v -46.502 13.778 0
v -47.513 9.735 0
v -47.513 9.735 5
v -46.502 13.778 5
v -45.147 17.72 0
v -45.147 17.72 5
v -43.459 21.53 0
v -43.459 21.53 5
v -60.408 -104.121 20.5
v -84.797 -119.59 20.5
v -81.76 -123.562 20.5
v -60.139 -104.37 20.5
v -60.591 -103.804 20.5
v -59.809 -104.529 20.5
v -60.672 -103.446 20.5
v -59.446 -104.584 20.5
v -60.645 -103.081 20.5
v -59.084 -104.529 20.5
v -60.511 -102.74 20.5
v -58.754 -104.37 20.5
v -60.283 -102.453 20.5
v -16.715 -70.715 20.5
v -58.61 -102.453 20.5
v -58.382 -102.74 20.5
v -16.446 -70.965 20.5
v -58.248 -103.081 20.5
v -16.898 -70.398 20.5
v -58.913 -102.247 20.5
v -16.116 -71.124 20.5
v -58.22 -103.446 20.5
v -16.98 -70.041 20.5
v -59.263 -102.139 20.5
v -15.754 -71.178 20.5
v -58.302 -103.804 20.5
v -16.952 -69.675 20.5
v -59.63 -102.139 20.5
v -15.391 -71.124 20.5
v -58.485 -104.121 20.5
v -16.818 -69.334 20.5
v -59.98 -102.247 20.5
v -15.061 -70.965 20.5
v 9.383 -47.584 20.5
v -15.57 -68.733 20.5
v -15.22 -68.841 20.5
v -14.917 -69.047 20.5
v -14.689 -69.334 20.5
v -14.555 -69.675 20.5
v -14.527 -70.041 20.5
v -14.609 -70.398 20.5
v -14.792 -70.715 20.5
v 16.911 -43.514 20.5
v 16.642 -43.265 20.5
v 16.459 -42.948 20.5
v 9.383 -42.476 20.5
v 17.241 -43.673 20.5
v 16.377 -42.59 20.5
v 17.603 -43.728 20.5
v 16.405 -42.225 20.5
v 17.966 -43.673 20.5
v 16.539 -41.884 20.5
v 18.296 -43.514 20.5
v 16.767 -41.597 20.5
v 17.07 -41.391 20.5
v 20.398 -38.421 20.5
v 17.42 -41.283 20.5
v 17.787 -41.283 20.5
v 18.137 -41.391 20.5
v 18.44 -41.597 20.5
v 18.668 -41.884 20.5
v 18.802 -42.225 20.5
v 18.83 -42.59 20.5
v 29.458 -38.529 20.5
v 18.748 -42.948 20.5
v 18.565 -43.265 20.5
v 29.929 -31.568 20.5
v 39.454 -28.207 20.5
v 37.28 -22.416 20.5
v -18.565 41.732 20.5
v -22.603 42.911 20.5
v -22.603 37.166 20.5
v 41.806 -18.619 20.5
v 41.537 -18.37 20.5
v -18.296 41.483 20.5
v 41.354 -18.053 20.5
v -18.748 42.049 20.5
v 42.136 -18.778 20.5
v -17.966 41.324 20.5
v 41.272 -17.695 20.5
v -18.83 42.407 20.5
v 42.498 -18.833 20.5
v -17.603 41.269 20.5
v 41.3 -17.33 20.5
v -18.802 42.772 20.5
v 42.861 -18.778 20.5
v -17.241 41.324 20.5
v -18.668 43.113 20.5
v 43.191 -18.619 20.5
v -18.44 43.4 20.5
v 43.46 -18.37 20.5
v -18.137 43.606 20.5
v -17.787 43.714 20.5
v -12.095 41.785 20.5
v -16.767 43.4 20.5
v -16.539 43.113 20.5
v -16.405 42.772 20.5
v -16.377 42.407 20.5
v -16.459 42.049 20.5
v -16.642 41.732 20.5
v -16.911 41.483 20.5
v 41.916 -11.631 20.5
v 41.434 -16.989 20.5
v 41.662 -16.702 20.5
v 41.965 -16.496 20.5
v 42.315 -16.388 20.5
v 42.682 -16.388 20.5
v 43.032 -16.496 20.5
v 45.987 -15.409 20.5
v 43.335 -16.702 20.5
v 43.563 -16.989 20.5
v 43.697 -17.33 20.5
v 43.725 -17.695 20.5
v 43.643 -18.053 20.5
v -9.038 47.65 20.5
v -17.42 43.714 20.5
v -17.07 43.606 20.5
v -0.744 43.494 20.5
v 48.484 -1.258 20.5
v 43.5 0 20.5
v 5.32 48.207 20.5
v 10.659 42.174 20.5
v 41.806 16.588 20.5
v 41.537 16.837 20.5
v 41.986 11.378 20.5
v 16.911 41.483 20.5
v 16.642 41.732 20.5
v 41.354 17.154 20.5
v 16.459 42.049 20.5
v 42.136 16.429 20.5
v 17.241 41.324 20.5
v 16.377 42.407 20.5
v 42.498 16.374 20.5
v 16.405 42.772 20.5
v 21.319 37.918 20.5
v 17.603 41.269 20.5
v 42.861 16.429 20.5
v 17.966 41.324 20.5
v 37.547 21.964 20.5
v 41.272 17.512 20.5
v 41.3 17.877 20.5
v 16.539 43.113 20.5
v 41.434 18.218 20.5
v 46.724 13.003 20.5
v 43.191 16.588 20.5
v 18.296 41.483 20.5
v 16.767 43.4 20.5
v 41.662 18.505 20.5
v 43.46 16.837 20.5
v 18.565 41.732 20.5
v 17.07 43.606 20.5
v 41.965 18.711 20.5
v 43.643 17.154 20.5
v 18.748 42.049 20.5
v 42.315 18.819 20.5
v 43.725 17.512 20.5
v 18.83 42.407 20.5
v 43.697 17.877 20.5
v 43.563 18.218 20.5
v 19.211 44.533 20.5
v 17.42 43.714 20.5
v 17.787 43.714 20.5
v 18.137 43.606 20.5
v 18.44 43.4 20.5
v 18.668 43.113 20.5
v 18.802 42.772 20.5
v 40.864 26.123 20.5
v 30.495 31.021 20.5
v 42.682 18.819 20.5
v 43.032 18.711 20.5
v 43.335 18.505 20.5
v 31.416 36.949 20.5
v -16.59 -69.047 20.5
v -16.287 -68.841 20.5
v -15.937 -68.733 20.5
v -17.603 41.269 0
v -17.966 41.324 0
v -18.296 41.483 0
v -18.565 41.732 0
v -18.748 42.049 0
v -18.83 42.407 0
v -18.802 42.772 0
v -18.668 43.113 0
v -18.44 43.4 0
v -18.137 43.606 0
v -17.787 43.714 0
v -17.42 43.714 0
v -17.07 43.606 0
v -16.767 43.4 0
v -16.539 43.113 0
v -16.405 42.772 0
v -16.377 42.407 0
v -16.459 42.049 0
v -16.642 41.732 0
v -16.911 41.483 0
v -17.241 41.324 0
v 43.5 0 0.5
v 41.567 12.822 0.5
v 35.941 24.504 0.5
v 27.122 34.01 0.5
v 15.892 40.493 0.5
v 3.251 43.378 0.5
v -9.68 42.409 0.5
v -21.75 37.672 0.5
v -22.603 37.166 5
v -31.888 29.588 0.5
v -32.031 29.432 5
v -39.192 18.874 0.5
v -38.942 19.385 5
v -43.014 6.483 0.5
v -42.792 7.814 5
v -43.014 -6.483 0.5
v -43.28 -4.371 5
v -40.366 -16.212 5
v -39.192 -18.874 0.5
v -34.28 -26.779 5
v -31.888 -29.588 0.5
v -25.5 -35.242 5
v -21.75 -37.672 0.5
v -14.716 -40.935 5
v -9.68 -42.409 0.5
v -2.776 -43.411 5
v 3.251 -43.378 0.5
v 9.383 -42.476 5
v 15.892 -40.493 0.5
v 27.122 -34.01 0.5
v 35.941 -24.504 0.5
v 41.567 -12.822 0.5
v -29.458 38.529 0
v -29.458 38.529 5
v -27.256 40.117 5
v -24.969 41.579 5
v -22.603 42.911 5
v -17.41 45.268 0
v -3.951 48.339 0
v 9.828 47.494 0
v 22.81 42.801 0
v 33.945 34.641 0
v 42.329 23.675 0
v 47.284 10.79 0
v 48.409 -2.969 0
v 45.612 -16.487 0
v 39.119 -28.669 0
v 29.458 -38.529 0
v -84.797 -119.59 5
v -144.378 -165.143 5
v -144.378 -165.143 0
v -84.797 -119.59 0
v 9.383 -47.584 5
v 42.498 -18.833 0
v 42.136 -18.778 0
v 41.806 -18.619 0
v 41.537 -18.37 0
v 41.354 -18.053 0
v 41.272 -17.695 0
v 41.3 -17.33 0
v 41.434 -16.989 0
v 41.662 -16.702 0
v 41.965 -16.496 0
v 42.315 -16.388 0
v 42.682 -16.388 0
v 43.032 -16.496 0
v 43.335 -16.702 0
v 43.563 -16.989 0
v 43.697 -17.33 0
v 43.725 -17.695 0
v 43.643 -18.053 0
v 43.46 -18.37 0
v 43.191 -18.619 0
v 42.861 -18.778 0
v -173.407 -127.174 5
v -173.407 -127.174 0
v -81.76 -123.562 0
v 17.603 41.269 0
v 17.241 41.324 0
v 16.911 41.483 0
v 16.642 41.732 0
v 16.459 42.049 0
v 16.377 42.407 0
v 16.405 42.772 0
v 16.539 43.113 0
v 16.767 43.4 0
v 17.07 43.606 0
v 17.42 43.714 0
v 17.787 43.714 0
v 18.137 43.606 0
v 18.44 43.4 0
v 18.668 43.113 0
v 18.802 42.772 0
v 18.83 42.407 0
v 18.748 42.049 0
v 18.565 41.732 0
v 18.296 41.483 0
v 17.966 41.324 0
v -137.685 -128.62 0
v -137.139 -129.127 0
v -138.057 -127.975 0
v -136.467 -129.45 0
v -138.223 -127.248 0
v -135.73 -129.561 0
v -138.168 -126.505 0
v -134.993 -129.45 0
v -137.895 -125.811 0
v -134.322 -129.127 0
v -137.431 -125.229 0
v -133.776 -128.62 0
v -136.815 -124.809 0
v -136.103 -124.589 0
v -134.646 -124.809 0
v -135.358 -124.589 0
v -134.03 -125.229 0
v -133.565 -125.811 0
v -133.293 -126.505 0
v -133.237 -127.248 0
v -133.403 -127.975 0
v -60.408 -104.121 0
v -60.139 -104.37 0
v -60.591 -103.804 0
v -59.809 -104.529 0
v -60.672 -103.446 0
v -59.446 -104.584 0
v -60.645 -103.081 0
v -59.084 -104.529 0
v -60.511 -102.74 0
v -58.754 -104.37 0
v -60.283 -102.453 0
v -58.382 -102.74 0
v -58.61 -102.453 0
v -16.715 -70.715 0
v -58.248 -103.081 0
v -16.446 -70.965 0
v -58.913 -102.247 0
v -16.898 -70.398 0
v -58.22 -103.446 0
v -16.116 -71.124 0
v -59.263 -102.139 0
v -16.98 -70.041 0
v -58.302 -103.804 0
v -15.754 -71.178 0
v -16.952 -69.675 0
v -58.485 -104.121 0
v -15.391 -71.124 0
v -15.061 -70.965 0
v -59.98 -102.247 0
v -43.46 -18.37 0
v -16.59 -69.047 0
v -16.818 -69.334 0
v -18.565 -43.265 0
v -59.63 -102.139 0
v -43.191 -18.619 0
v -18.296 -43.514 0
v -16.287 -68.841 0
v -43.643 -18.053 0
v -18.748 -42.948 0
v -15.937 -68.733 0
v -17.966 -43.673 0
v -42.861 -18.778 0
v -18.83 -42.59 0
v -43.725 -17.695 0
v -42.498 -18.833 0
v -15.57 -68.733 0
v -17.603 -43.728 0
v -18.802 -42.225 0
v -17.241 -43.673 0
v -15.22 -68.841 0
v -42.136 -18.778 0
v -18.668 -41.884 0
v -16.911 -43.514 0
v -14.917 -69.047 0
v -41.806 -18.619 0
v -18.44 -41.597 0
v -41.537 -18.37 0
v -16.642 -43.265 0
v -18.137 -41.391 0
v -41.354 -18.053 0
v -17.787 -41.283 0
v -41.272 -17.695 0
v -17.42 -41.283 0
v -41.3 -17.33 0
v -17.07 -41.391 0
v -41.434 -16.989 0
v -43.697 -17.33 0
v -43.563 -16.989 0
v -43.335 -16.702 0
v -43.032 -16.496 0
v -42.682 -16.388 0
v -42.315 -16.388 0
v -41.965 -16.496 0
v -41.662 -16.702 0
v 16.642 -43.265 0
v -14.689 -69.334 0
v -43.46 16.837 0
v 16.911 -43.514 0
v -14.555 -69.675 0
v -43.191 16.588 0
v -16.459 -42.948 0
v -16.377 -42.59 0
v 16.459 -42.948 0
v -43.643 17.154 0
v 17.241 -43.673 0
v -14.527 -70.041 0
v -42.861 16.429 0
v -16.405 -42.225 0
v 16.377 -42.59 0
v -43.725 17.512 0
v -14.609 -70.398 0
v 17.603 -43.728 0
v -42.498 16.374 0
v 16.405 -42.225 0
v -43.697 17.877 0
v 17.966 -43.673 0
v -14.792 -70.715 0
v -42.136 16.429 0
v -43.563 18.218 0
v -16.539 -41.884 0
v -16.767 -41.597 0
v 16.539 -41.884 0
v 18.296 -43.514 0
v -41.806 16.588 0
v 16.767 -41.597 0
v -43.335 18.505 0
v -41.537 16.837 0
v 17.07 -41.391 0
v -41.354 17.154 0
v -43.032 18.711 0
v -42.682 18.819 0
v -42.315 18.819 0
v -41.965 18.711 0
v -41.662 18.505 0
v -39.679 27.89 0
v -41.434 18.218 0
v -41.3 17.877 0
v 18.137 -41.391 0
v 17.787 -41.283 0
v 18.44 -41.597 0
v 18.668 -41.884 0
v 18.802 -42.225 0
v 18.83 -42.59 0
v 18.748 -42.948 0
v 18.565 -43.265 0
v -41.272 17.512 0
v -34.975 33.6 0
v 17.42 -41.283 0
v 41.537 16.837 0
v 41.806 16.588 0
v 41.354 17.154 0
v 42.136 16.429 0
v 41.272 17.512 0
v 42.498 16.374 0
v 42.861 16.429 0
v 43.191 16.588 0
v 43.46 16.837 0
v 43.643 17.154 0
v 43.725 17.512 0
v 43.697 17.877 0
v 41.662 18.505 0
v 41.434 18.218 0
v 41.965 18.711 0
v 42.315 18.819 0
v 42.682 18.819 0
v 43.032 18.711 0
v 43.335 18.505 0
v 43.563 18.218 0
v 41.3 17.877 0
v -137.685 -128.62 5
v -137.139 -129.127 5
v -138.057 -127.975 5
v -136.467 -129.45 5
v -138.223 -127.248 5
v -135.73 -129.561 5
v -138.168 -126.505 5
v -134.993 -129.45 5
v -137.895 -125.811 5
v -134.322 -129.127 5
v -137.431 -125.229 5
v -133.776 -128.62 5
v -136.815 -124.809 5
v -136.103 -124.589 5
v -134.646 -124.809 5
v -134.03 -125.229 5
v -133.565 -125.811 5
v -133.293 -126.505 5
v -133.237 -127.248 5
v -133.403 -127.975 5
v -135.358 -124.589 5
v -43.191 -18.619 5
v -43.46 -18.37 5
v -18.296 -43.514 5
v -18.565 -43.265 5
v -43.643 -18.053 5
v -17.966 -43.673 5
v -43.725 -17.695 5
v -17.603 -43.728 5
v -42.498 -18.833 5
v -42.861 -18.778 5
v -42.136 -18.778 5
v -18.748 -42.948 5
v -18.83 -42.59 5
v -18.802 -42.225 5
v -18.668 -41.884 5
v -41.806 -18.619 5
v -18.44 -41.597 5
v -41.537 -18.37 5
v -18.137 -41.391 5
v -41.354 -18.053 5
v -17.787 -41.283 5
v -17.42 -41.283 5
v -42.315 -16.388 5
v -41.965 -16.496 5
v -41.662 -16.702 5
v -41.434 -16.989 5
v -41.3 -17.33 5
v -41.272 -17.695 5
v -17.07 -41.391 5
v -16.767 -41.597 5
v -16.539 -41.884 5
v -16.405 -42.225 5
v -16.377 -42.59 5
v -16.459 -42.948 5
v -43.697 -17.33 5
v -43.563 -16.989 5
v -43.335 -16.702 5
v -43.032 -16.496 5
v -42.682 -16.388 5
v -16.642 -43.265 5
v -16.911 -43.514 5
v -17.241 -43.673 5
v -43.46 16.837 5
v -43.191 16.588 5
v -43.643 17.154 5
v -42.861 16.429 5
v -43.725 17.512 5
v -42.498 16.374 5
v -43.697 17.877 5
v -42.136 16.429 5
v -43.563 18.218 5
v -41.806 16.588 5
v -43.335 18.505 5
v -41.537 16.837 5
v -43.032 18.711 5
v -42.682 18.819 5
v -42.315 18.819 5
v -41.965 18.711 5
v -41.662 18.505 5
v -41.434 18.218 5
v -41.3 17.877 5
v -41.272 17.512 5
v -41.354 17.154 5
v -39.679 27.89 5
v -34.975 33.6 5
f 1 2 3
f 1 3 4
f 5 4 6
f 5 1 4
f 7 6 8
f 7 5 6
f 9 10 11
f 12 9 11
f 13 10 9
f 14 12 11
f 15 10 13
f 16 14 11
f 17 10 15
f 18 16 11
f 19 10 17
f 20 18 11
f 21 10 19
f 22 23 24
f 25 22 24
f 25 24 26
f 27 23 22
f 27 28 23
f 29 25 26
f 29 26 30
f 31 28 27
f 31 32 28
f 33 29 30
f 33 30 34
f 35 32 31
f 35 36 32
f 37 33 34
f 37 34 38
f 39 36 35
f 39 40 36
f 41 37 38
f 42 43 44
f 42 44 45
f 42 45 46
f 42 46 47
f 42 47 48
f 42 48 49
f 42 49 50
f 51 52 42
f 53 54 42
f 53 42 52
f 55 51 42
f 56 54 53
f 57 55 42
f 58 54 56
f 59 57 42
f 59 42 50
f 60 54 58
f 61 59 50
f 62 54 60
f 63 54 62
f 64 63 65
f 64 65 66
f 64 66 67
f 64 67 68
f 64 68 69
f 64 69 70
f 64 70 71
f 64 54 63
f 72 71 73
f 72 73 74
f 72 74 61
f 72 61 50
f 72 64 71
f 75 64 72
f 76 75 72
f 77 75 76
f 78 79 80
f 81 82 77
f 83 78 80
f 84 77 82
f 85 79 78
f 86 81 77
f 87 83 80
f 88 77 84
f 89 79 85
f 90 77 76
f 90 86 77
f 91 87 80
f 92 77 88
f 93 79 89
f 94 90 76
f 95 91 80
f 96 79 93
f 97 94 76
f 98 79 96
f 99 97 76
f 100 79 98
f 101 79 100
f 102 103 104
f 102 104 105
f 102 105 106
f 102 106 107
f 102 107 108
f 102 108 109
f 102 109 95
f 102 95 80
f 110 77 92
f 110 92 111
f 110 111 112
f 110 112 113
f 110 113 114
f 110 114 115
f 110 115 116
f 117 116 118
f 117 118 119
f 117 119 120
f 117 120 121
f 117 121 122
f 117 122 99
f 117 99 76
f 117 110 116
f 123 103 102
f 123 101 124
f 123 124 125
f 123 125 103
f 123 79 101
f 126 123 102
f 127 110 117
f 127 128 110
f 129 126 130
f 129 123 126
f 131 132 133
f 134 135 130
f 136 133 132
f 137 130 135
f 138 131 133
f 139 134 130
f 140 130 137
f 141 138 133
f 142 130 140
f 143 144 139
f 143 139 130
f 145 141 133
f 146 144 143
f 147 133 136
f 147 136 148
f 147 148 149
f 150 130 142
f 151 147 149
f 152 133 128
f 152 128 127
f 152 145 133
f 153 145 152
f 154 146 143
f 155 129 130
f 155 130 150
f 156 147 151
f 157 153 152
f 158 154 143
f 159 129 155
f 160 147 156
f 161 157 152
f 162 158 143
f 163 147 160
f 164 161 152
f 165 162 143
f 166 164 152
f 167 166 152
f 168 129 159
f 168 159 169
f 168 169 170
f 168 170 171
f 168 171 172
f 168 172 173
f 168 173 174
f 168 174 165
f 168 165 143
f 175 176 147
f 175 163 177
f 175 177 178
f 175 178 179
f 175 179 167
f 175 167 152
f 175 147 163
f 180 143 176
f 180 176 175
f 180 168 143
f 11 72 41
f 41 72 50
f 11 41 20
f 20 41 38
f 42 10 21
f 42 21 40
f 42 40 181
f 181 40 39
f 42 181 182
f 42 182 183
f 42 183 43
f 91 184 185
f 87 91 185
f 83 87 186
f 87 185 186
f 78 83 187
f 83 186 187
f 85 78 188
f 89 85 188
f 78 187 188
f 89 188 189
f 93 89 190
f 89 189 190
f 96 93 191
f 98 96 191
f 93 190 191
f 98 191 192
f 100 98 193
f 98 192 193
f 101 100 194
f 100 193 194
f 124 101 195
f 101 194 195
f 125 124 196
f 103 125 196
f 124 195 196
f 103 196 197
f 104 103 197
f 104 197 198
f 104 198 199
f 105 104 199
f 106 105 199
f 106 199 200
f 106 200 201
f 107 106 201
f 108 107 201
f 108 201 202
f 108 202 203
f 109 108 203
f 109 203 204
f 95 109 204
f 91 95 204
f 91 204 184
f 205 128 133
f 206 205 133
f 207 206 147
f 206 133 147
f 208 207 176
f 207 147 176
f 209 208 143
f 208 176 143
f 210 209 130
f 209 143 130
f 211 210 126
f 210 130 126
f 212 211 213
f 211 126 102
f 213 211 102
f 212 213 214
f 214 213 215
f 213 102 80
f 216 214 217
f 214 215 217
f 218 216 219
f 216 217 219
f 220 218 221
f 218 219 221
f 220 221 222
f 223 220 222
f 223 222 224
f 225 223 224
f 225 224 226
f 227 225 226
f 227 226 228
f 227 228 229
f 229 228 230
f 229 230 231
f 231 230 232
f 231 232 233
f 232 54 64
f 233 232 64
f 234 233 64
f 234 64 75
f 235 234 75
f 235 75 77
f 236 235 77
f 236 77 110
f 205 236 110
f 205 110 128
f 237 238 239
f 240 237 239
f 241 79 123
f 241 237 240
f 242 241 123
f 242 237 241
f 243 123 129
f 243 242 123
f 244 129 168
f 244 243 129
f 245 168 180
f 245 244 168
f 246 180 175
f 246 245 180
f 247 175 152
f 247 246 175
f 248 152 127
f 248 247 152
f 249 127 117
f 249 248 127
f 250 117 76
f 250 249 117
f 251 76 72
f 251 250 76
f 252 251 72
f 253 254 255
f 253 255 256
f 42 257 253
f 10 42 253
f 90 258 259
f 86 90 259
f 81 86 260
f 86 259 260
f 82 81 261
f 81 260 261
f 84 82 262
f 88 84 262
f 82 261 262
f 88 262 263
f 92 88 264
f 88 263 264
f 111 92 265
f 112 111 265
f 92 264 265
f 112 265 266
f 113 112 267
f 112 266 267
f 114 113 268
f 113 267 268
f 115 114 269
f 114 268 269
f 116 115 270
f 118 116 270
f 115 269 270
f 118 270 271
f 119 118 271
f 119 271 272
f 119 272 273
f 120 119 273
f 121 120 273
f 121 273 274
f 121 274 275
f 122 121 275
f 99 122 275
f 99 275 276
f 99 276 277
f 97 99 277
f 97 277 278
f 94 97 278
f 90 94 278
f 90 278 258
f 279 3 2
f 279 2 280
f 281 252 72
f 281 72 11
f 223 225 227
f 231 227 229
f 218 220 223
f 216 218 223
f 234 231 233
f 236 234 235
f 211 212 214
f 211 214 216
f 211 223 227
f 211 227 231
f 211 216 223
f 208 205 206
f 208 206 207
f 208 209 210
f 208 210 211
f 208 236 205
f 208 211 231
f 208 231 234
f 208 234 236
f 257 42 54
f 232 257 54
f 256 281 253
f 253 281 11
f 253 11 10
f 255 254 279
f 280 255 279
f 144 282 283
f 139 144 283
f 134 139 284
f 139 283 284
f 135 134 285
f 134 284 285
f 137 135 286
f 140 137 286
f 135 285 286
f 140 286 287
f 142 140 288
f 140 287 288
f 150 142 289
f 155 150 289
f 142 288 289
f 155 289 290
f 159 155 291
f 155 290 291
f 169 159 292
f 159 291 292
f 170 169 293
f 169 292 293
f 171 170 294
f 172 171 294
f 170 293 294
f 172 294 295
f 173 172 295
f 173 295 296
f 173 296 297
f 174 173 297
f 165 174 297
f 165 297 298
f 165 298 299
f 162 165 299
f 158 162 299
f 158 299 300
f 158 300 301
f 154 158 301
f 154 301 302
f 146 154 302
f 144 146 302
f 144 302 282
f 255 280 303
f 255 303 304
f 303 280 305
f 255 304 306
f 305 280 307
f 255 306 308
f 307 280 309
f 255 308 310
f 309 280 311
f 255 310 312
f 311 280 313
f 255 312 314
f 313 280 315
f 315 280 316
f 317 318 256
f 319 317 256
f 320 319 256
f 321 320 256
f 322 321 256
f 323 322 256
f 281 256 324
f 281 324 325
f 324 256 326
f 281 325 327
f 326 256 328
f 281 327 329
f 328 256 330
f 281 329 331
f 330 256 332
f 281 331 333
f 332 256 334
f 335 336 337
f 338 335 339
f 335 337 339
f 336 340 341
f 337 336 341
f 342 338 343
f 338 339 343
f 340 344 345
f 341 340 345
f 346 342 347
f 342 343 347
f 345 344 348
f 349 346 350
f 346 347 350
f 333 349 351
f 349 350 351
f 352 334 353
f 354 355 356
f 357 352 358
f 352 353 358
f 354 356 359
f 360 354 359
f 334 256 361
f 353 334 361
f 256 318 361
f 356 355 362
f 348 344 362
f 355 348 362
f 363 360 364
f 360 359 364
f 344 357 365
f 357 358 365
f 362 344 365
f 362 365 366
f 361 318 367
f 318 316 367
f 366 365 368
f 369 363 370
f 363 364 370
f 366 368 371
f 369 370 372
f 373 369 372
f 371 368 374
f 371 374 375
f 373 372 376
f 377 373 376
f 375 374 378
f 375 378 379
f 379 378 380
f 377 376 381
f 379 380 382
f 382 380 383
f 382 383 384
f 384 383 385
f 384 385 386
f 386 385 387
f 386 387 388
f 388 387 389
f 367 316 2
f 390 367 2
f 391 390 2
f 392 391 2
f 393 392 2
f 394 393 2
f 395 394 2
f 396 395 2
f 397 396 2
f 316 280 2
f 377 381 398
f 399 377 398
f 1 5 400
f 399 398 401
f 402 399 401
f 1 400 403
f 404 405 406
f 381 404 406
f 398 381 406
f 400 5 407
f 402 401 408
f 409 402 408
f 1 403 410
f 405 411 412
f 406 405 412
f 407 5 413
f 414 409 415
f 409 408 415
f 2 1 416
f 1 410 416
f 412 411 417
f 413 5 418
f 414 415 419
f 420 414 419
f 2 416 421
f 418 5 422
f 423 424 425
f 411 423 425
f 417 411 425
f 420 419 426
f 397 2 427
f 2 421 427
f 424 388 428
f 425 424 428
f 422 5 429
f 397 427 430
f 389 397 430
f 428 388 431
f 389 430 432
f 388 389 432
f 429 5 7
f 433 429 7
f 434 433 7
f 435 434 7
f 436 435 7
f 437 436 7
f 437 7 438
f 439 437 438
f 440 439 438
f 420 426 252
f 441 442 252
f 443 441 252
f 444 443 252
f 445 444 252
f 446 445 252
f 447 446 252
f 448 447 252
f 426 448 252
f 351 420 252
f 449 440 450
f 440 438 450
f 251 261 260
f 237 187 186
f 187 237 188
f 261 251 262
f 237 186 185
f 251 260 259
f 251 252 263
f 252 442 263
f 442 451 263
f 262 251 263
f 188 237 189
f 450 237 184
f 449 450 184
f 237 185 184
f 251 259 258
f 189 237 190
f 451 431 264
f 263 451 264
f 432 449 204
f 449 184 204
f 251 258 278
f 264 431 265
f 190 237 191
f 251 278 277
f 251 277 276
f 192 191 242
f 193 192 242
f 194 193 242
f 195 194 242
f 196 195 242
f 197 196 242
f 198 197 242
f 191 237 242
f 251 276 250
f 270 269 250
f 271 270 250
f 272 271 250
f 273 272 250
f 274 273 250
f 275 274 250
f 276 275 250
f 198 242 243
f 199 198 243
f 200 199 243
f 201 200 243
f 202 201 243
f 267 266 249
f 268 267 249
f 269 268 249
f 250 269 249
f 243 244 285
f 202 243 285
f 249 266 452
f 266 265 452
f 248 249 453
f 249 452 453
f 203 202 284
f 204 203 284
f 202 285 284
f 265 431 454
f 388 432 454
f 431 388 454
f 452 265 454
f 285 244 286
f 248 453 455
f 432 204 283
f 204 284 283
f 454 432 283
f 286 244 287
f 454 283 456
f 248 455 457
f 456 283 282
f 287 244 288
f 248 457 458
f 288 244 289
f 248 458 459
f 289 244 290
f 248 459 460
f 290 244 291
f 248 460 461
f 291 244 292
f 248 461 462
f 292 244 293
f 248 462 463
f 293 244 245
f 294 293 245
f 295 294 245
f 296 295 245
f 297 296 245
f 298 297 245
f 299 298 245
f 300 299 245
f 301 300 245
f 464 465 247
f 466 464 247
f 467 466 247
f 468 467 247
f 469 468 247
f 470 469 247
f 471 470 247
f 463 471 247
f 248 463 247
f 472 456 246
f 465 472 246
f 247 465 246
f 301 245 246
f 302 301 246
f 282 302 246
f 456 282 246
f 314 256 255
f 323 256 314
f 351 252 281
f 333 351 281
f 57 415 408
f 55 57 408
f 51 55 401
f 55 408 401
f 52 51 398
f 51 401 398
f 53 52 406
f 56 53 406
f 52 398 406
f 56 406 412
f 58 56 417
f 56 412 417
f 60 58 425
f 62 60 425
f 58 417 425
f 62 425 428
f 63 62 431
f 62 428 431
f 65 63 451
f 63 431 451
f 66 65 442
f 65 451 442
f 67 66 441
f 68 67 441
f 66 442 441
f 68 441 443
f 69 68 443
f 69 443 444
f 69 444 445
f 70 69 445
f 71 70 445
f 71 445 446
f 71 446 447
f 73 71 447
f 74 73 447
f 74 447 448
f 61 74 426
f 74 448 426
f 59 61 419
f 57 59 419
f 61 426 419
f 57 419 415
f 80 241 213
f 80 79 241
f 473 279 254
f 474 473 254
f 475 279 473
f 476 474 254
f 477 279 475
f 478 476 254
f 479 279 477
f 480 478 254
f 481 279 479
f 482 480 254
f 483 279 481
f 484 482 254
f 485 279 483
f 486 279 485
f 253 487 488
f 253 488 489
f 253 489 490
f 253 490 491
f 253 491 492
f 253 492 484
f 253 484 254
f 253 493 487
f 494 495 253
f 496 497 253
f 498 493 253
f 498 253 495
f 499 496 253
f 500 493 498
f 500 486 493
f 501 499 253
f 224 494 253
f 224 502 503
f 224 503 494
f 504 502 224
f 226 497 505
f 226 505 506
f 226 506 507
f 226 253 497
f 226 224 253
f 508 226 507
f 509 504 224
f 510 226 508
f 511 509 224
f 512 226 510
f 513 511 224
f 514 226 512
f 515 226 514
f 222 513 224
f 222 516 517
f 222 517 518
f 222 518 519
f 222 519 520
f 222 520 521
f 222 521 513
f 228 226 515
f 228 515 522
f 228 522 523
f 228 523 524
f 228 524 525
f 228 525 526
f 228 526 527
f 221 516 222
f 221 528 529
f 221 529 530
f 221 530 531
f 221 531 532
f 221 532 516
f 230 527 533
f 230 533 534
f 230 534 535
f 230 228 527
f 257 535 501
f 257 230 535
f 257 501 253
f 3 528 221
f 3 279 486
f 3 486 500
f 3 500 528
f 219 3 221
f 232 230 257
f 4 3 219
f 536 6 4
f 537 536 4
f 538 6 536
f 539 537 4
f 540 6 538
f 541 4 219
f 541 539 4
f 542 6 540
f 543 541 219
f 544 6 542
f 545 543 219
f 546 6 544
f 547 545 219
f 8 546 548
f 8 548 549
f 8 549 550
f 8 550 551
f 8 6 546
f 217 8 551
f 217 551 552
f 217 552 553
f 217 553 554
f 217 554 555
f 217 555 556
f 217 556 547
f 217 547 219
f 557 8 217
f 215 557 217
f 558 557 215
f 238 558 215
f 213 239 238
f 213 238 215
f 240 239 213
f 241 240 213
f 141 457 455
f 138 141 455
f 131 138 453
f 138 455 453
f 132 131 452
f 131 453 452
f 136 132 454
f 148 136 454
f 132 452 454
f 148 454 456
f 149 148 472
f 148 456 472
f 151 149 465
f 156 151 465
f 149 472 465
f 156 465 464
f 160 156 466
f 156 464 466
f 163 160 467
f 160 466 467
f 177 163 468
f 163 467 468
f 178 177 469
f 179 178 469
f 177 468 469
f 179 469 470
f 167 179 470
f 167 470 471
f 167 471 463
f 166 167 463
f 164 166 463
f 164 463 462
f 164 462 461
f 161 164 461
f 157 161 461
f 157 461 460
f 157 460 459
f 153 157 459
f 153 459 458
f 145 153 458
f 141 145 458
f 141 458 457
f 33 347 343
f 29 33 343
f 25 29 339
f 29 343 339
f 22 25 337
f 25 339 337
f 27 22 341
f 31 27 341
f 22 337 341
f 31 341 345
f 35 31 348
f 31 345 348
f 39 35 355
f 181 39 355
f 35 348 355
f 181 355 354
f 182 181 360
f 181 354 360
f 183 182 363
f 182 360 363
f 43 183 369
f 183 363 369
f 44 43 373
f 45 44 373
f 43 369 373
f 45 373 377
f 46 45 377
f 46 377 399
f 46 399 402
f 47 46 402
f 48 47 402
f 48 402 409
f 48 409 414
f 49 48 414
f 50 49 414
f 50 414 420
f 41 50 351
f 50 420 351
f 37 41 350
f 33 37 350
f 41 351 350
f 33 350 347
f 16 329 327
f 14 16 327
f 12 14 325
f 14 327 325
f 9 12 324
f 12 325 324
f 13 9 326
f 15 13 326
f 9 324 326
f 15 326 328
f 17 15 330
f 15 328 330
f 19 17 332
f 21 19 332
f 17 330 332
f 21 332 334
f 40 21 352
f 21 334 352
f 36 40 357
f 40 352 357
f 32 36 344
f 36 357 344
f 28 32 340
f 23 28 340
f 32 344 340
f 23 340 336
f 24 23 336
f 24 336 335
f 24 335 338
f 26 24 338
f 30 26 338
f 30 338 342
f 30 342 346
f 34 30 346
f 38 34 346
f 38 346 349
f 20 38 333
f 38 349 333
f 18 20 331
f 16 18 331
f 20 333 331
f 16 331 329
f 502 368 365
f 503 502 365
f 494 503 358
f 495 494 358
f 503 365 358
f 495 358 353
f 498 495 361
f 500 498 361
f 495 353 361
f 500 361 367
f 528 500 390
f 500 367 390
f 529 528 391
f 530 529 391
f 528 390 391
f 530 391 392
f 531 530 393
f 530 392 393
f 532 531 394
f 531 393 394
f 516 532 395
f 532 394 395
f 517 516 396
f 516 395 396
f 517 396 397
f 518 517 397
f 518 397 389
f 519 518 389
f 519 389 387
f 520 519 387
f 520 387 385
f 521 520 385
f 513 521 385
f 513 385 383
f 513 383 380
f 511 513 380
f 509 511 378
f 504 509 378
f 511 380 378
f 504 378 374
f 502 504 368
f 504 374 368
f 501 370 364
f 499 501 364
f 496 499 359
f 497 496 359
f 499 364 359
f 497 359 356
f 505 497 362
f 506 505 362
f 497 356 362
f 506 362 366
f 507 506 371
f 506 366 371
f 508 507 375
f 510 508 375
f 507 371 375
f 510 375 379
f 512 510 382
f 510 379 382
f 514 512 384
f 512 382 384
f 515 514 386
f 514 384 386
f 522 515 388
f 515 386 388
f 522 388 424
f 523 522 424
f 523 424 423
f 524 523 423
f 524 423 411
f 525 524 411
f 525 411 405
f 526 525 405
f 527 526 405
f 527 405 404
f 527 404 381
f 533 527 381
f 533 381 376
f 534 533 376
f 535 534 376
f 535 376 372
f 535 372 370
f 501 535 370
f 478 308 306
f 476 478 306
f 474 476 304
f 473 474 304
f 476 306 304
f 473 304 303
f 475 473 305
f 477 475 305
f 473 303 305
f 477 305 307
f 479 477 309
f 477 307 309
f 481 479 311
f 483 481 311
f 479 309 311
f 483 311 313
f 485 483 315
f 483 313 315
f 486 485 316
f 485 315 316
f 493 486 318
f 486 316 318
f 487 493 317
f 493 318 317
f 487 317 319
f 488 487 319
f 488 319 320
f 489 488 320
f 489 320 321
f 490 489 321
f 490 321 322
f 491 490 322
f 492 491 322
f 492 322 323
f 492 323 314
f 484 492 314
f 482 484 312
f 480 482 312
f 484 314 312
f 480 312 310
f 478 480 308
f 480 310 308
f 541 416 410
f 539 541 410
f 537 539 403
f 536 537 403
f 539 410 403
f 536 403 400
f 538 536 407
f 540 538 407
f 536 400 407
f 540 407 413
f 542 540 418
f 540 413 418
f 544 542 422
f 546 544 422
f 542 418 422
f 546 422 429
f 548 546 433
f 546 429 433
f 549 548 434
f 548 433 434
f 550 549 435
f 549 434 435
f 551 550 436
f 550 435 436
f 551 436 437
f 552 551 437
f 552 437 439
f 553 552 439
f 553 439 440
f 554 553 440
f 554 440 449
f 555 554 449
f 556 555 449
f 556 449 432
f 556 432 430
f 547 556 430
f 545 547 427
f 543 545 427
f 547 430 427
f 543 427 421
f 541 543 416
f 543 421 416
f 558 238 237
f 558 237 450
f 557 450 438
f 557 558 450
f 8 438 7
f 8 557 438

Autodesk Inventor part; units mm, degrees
ref_plane "YZ Plane" through (0, 0, 0) normal (1, 0, 0) x (0, 1, 0)
ref_plane "XZ Plane" through (0, 0, 0) normal (0, 1, 0) x (-1, 0, 0)
ref_plane "XY Plane" through (0, 0, 0) normal (0, 0, 1) x (1, 0, 0)
sketch "スケッチ1" plane through (0, 0, 0) normal (0, 0, 1) x (1, 0, 0)
  circle A0 centre (0, 0) radius 48.5
  circle A1 centre (0, 0) radius 46
  dimension "d0" = 97
  dimension "d1" = 92
extrude "押し出し1" add sketch "スケッチ1" along normal blind 20.5 contours A0 | A1
sketch "スケッチ2" plane through (0, 0, 20.5) normal (0, 0, 1) x (1, 0, 0)
  circle A0 centre (0, 0) radius 46
  line L0 (0, 0) -> (0, 59.211017)
  line L1 (0, 0) -> (-21.860946, 52.776992)
  line L2 (0, 0) -> (27.822621, 47.858094)
  point P0 (-17.603438, 42.498458)
  point P1 (-42.498458, 17.603438)
  point P2 (-42.498458, -17.603438)
  point P3 (-17.603438, -42.498458)
  point P4 (17.603438, -42.498458)
  point P5 (42.498458, -17.603438)
  point P6 (42.498458, 17.603438)
  point P7 (17.603438, 42.498458)
  dimension "d4" = 92
  dimension "d5" = 22.5
  dimension "d8" = 360
hole "穴1" at (-17.603438, 42.498458, 20.5) at (-42.498458, 17.603438, 20.5) at (-42.498458, -17.603438, 20.5) at (-17.603438, -42.498458, 20.5) at (17.603438, -42.498458, 20.5) at (42.498458, -17.603438, 20.5) at (42.498458, 17.603438, 20.5) at (17.603438, 42.498458, 20.5) direction (0, 0, -1) diameter 2.459 end through all
sketch "スケッチ3" plane through (0, 0, 20.5) normal (0, 0, 1) x (1, 0, 0)
  circle A0 centre (0, 0) radius 43.5
  dimension "d17" = 87
extrude "押し出し2" cut sketch "スケッチ3" against normal blind 20
sketch "スケッチ4" plane through (0, 0, 0) normal (0, 0, -1) x (-1, 0, 0)
  line L0 (0, 0) -> (0, -80.557014)
  circle A0 centre (0, 0) radius 48.5
  line L1 (-29.457728, -38.529109) -> (145.313488, -172.151794)
  line L2 (29.457728, 38.529109) -> (204.228945, -95.093576)
  line L3 (145.313488, -172.151794) -> (204.228945, -95.093576)
  point P0 (29.457728, 38.529109)
  dimension "d21" = 48.5
  dimension "d23" = 97
  dimension "d24" = 220
  dimension "d25" = 220
  dimension "d56" = 52.6
extrude "押し出し3" add sketch "スケッチ4" against normal blind 5 contours A0 L2 L3 L1 L0 | L0 L1 A0
sketch "スケッチ5" plane through (0, 0, 5) normal (0, 0, 1) x (1, 0, 0)
  line L0 (-29.457728, 38.529109) -> (29.457728, -38.529109)
  line L1 (-204.228945, -95.093576) -> (-145.313488, -172.151794)
  line L2 (29.457728, -38.529109) -> (-145.313488, -172.151794)
  line L3 (-145.313488, -172.151794) -> (-204.228945, -95.093576)
  line L4 (-204.228945, -95.093576) -> (-29.457728, 38.529109)
  line L5 (-26.420849, 34.557036) -> (-201.192066, -99.065649)
  line L6 (26.420849, -34.557036) -> (-148.350367, -168.179721)
  line L7 (-200.256872, -92.056696) -> (-141.341415, -169.114915)
  circle A0 centre (0, 0) radius 48.5
  circle A1 centre (0, 0) radius 43.5
  point P0 (-116.843336, -28.282233)
  point P1 (-60.964759, -101.368378)
  point P2 (-57.92788, -105.340451)
  point P3 (-174.771217, -133.622685)
  point P4 (-170.799143, -130.585806)
  point P5 (-174.771217, -133.622685)
  point P6 (-43.459144, 21.530276)
  point P7 (9.382554, -47.583796)
  point P8 (-144.378294, -165.142842)
  point P9 (-197.219992, -96.02877)
  dimension "d29" = 5
  dimension "d30" = 5
  dimension "d32" = 5
  dimension "d33" = 5
extrude "押し出し4" add sketch "スケッチ5" along normal blind 15.5 contours A0 L5 L7 L4 | L7 L5 L1 L4 | L7 L6 L1 L5 | L2 L7 L6 A0 | L7 L2 L1 L6
sketch "スケッチ6" plane through (0, 0, 20.5) normal (0, 0, 1) x (1, 0, 0)
  line L0 (-204.228945, -95.093576) -> (-145.313488, -172.151794)
  arc A0 (29.457728, -38.529109) -> (-29.457728, 38.529109) centre (0, 0) ccw
  line L1 (-29.457728, 38.529109) -> (-204.228945, -95.093576)
  line L2 (-145.313488, -172.151794) -> (29.457728, -38.529109)
  point P0 (-15.753516, -69.948744)
  point P1 (-71.632093, 3.137401)
  point P2 (-59.44632, -103.354415)
  point P3 (-115.324897, -30.26827)
  point P4 (-103.139124, -136.760086)
  point P5 (-159.017701, -63.673941)
  point P6 (-174.771217, -133.622685)
  point P7 (38.529109, 29.457728)
  point P8 (9.382554, -47.583796)
  dimension "d36" = 268.5
  dimension "d37" = 55
  dimension "d38" = 55
  dimension "d39" = 55
  dimension "d40" = 2.5
  dimension "d41" = 2.5
  dimension "d42" = 2.5
  dimension "d43" = 55
  dimension "d44" = 55
  dimension "d45" = 55
  dimension "d46" = 2.5
  dimension "d47" = 2.5
  dimension "d48" = 2.5
hole "穴2" at (-15.753516, -69.948744, 20.5) at (-71.632093, 3.137401, 20.5) at (-59.44632, -103.354415, 20.5) at (-115.324897, -30.26827, 20.5) at (-103.139124, -136.760086, 20.5) at (-159.017701, -63.673941, 20.5) direction (0, 0, -1) diameter 2.459 end through all
sketch "スケッチ7" plane through (0, 0, 5) normal (0, 0, 1) x (1, 0, 0)
  line L0 (9.382554, -47.583796) -> (-144.378294, -165.142842)
  line L1 (-144.378294, -165.142842) -> (-197.219992, -96.02877)
  point P0 (0, 0)
  point P1 (-135.730252, -127.061201)
  dimension "d57" = 25
  dimension "d58" = 30
hole "穴3" at (-135.730252, -127.061201, 5) direction (0, 0, -1) diameter 5 end through all
sketch "スケッチ8" plane through (0, 0, 5) normal (0, 0, 1) x (1, 0, 0)
  line L0 (-204.228945, -95.093576) -> (-29.457728, 38.529109)
  line L1 (29.457728, -38.529109) -> (-145.313488, -172.151794)
  line L2 (-204.228945, -95.093576) -> (-145.313488, -172.151794)
  line L3 (-145.313488, -172.151794) -> (-204.228945, -95.093576)
  line L4 (29.457728, -38.529109) -> (-145.313488, -172.151794)
  arc A0 (-43.459144, 21.530276) -> (9.382554, -47.583796) centre (0, 0) ccw
  line L5 (-43.459144, 21.530276) -> (-176.491161, -123.140956)
  line L6 (-197.219992, -96.02877) -> (-144.378294, -165.142842)
  line L7 (-47.512963, 9.734903) -> (-173.407433, -127.174304)
  dimension "d66" = 80
  dimension "d67" = 5
extrude "押し出し5" add sketch "スケッチ8" along normal blind 10
sketch "スケッチ9" plane through (0, 0, 20.5) normal (0, 0, 1) x (1, 0, 0)
  circle A0 centre (0, 0) radius 48.5
  line L0 (-29.457728, 38.529109) -> (-204.228945, -95.093576)
  line L1 (-29.457728, 38.529109) -> (-204.228945, -95.093576)
  line L2 (-204.228945, -95.093576) -> (-144.905471, -172.685458)
  line L3 (-43.459144, 21.530276) -> (-179.92775, -126.878218)
  line L4 (-43.459144, 21.530276) -> (-176.491161, -123.140956)
  dimension "d70" = 97
  dimension "d71" = 80
  dimension "d72" = 0
sketch "スケッチ9 outline for 押し出し6" plane through (0, 0, 20.5) normal (0, 0, 1) x (1, 0, 0)
  line L0 (-179.92775, -126.878218) -> (-43.459144, 21.530276)
  line L1 (-204.228945, -95.093576) -> (-179.92775, -126.878218)
  line L2 (-29.457728, 38.529109) -> (-204.228945, -95.093576)
  arc A0 (-43.459144, 21.530276) -> (-29.457728, 38.529109) centre (0, 0) cw
extrude "押し出し6" cut sketch "スケッチ9 outline for 押し出し6" against normal through all
sketch "スケッチ10" plane through (0, 0, 20.5) normal (0, 0, 1) x (1, 0, 0)
  line L0 (-47.512963, 9.734903) -> (-173.407433, -127.174304)
  line L1 (-65.245855, -9.549472) -> (-68.329583, -5.516124)
  line L2 (-176.491161, -123.140956) -> (-179.92775, -126.878218)
  line L3 (-144.378294, -165.142842) -> (-173.407433, -127.174304)
  line L4 (-173.407433, -127.174304) -> (-176.527747, -123.093103)
  line L5 (-158.56619, -111.034574) -> (-161.649918, -107.001226)
  line L6 (-68.329583, -5.516124) -> (-161.649918, -107.001226)
  line L7 (-158.56619, -111.034574) -> (-65.245855, -9.549472)
  circle A0 centre (0, 0) radius 48.5
  line L8 (-43.459144, 21.530276) -> (-68.329583, -5.516124)
  line L9 (-47.512963, 9.734903) -> (-65.245855, -9.549472)
  line L10 (-158.56619, -111.034574) -> (-173.407433, -127.174304)
  line L11 (-144.378294, -165.142842) -> (-173.407433, -127.174304)
  line L12 (-179.92775, -126.878218) -> (-145.069701, -172.470655)
  line L13 (-144.378294, -165.142842) -> (9.382554, -47.583796)
  line L14 (-145.069701, -172.470655) -> (-81.516531, -123.880587)
  line L15 (-161.649918, -107.001226) -> (-179.92775, -126.878218)
  line L16 (-81.516531, -123.880587) -> (-84.797198, -119.589654)
  line L17 (9.382554, -47.583796) -> (9.382554, -42.583206)
  line L18 (-35.700709, 32.828485) -> (-32.020223, 29.444105)
  circle A1 centre (0, 0) radius 43.5
  circle A2 centre (0, 0) radius 43.5
  dimension "d75" = 97
  dimension "d78" = 80
  dimension "d79" = 87
  dimension "d80" = 5
extrude "押し出し7" cut sketch "スケッチ10" against normal through all contours L0 L1 L8 A0 | L0 L5 L6 L1 | L0 L4 L15 L5 | L16 L14 L12 L2 L4 L3 L13
sketch "スケッチ11" plane through (0, 0, 20.5) normal (0, 0, 1) x (1, 0, 0)
  circle A0 centre (0, 0) radius 43.5
  circle A1 centre (0, 0) radius 48.5
  line L0 (-22.603438, 42.910775) -> (-22.603438, 37.16631)
  circle A2 centre (-17.603438, 42.498458) radius 1.2295
  arc A3 (-47.512963, 9.734903) -> (9.382554, -47.583796) centre (0, 0) ccw
  line L1 (9.382554, -47.583796) -> (9.382554, -42.476084)
  point P0 (-22.603438, 40.038542)
  dimension "d81" = 87
  dimension "d82" = 97
  dimension "d83" = 5
extrude "押し出し8" cut sketch "スケッチ11" against normal blind 15.5 contours A0 L1 A1 L0 picked at (-35.223195, -30.551112)
equation "\"d25\" = d24"
equation "\"d41\" = d40"
equation "\"d42\" = d41"
equation "\"d43\" = d37"
equation "\"d44\" = d43"
equation "\"d45\" = d44"
equation "\"d46\" = d40"
equation "\"d47\" = d46"
equation "\"d48\" = d46"
properties part number "legparts_05"
